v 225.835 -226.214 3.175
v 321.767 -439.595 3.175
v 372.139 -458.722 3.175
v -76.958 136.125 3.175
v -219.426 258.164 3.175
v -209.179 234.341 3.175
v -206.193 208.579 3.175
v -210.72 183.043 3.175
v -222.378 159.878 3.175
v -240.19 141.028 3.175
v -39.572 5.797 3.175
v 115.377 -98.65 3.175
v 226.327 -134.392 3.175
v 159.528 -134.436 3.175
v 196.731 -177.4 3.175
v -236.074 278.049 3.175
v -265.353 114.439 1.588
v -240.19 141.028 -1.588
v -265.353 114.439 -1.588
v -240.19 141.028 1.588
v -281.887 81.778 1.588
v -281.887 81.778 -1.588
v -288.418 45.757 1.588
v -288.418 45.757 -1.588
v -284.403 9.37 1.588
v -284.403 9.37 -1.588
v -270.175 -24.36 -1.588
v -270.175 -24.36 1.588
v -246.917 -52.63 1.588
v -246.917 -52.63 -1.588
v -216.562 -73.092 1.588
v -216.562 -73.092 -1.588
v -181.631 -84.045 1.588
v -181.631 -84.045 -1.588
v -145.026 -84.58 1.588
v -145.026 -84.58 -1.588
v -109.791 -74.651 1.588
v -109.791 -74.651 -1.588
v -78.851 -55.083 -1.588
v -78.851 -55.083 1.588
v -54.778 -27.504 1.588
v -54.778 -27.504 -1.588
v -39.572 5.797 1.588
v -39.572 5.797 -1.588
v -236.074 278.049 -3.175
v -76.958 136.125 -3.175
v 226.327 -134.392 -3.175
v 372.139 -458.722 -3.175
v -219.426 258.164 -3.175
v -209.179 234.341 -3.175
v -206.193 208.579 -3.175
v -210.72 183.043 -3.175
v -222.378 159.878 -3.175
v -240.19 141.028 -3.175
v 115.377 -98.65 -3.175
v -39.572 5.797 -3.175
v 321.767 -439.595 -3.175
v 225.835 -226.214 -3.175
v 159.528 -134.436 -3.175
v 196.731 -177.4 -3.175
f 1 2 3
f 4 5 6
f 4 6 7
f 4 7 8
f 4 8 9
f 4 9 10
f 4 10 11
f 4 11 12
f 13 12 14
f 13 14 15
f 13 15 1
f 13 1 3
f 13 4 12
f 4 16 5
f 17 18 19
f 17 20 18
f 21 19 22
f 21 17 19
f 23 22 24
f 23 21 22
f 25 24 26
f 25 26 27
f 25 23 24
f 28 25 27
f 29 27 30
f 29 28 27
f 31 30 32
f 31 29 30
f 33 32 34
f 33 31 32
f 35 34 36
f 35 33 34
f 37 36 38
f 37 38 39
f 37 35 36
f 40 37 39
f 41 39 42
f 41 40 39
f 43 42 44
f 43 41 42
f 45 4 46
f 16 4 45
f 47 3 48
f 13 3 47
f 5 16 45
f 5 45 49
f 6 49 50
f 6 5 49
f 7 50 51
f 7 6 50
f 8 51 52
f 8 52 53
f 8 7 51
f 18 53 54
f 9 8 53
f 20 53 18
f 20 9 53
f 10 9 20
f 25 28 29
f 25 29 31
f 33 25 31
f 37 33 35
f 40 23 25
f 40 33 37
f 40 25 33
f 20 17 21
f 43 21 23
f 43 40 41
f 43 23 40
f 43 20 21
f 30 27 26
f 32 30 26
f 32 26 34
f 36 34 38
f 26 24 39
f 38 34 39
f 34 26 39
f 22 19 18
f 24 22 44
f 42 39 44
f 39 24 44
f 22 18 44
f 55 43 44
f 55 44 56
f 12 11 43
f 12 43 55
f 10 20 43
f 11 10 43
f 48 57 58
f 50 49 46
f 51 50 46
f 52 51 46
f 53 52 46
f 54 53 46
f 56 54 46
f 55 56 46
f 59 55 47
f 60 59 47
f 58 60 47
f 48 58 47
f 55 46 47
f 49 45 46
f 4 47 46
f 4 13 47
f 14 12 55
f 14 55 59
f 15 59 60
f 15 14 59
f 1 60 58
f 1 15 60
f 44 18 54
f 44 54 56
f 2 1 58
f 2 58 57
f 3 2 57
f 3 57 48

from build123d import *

# Parameters (mm, degrees)
F1_DEPTH      = 1.5875
F1_DEPTH_BACK = 1.5875
F2_DEPTH      = 3.175
F2_DEPTH_BACK = 3.175


with BuildPart() as f1:
    # F0 (on Top) → F1 (new body, two sides)
    with BuildSketch(Plane.XY) as f1_sk:
        with BuildLine():
            ThreePointArc((-240.189908, 141.027898), (-232.480487, -63.960841), (-39.572017, 5.796884))
            Line((-39.572017, 5.796884), (-240.189908, 141.027898))
        make_face()
        with BuildLine():
            ThreePointArc((-39.572017, 5.796884), (-35.770322, 23.39217), (-34.494547, 41.34821))
            ThreePointArc((-34.494547, 41.34821), (-45.59562, 93.275456), (-76.95815, 136.124777))
            ThreePointArc((-76.95815, 136.124777), (-157.681468, 168.290955), (-240.189908, 141.027898))
            Line((-240.189908, 141.027898), (-39.572017, 5.796884))
        make_face()
    extrude(amount=F1_DEPTH)
    extrude(f1_sk.sketch, amount=-F1_DEPTH_BACK)

    # F0 (on Top) → F2 (join, two sides)
    with BuildSketch(Plane.XY) as f2_sk:
        with BuildLine():
            ThreePointArc((-240.189908, 141.027898), (-157.681468, 168.290955), (-76.95815, 136.124777))
            Line((-76.95815, 136.124777), (-236.074097, 278.048981))
            ThreePointArc((-236.074097, 278.048981), (-206.193013, 208.579063), (-240.189908, 141.027898))
        make_face()
        with BuildLine():
            ThreePointArc((-76.95815, 136.124777), (-45.59562, 93.275456), (-34.494547, 41.34821))
            ThreePointArc((-34.494547, 41.34821), (-35.770322, 23.39217), (-39.572017, 5.796884))
            Line((-39.572017, 5.796884), (115.377201, -98.650131))
            ThreePointArc((115.377201, -98.650131), (179.07571, -155.098555), (225.835229, -226.214459))
            Line((225.835229, -226.214459), (321.766937, -439.594988))
            Line((321.766937, -439.594988), (372.139368, -458.721884))
            Line((372.139368, -458.721884), (226.326865, -134.391691))
            Line((226.326865, -134.391691), (-76.95815, 136.124777))
        make_face()
        with BuildLine():
            ThreePointArc((-39.572017, 5.796884), (-35.770322, 23.39217), (-34.494547, 41.34821))
            ThreePointArc((-34.494547, 41.34821), (-45.59562, 93.275456), (-76.95815, 136.124777))
            ThreePointArc((-76.95815, 136.124777), (-157.681468, 168.290955), (-240.189908, 141.027898))
            Line((-240.189908, 141.027898), (-39.572017, 5.796884))
        make_face()
    extrude(amount=F2_DEPTH)
    extrude(f2_sk.sketch, amount=-F2_DEPTH_BACK)


solid = f1.part
